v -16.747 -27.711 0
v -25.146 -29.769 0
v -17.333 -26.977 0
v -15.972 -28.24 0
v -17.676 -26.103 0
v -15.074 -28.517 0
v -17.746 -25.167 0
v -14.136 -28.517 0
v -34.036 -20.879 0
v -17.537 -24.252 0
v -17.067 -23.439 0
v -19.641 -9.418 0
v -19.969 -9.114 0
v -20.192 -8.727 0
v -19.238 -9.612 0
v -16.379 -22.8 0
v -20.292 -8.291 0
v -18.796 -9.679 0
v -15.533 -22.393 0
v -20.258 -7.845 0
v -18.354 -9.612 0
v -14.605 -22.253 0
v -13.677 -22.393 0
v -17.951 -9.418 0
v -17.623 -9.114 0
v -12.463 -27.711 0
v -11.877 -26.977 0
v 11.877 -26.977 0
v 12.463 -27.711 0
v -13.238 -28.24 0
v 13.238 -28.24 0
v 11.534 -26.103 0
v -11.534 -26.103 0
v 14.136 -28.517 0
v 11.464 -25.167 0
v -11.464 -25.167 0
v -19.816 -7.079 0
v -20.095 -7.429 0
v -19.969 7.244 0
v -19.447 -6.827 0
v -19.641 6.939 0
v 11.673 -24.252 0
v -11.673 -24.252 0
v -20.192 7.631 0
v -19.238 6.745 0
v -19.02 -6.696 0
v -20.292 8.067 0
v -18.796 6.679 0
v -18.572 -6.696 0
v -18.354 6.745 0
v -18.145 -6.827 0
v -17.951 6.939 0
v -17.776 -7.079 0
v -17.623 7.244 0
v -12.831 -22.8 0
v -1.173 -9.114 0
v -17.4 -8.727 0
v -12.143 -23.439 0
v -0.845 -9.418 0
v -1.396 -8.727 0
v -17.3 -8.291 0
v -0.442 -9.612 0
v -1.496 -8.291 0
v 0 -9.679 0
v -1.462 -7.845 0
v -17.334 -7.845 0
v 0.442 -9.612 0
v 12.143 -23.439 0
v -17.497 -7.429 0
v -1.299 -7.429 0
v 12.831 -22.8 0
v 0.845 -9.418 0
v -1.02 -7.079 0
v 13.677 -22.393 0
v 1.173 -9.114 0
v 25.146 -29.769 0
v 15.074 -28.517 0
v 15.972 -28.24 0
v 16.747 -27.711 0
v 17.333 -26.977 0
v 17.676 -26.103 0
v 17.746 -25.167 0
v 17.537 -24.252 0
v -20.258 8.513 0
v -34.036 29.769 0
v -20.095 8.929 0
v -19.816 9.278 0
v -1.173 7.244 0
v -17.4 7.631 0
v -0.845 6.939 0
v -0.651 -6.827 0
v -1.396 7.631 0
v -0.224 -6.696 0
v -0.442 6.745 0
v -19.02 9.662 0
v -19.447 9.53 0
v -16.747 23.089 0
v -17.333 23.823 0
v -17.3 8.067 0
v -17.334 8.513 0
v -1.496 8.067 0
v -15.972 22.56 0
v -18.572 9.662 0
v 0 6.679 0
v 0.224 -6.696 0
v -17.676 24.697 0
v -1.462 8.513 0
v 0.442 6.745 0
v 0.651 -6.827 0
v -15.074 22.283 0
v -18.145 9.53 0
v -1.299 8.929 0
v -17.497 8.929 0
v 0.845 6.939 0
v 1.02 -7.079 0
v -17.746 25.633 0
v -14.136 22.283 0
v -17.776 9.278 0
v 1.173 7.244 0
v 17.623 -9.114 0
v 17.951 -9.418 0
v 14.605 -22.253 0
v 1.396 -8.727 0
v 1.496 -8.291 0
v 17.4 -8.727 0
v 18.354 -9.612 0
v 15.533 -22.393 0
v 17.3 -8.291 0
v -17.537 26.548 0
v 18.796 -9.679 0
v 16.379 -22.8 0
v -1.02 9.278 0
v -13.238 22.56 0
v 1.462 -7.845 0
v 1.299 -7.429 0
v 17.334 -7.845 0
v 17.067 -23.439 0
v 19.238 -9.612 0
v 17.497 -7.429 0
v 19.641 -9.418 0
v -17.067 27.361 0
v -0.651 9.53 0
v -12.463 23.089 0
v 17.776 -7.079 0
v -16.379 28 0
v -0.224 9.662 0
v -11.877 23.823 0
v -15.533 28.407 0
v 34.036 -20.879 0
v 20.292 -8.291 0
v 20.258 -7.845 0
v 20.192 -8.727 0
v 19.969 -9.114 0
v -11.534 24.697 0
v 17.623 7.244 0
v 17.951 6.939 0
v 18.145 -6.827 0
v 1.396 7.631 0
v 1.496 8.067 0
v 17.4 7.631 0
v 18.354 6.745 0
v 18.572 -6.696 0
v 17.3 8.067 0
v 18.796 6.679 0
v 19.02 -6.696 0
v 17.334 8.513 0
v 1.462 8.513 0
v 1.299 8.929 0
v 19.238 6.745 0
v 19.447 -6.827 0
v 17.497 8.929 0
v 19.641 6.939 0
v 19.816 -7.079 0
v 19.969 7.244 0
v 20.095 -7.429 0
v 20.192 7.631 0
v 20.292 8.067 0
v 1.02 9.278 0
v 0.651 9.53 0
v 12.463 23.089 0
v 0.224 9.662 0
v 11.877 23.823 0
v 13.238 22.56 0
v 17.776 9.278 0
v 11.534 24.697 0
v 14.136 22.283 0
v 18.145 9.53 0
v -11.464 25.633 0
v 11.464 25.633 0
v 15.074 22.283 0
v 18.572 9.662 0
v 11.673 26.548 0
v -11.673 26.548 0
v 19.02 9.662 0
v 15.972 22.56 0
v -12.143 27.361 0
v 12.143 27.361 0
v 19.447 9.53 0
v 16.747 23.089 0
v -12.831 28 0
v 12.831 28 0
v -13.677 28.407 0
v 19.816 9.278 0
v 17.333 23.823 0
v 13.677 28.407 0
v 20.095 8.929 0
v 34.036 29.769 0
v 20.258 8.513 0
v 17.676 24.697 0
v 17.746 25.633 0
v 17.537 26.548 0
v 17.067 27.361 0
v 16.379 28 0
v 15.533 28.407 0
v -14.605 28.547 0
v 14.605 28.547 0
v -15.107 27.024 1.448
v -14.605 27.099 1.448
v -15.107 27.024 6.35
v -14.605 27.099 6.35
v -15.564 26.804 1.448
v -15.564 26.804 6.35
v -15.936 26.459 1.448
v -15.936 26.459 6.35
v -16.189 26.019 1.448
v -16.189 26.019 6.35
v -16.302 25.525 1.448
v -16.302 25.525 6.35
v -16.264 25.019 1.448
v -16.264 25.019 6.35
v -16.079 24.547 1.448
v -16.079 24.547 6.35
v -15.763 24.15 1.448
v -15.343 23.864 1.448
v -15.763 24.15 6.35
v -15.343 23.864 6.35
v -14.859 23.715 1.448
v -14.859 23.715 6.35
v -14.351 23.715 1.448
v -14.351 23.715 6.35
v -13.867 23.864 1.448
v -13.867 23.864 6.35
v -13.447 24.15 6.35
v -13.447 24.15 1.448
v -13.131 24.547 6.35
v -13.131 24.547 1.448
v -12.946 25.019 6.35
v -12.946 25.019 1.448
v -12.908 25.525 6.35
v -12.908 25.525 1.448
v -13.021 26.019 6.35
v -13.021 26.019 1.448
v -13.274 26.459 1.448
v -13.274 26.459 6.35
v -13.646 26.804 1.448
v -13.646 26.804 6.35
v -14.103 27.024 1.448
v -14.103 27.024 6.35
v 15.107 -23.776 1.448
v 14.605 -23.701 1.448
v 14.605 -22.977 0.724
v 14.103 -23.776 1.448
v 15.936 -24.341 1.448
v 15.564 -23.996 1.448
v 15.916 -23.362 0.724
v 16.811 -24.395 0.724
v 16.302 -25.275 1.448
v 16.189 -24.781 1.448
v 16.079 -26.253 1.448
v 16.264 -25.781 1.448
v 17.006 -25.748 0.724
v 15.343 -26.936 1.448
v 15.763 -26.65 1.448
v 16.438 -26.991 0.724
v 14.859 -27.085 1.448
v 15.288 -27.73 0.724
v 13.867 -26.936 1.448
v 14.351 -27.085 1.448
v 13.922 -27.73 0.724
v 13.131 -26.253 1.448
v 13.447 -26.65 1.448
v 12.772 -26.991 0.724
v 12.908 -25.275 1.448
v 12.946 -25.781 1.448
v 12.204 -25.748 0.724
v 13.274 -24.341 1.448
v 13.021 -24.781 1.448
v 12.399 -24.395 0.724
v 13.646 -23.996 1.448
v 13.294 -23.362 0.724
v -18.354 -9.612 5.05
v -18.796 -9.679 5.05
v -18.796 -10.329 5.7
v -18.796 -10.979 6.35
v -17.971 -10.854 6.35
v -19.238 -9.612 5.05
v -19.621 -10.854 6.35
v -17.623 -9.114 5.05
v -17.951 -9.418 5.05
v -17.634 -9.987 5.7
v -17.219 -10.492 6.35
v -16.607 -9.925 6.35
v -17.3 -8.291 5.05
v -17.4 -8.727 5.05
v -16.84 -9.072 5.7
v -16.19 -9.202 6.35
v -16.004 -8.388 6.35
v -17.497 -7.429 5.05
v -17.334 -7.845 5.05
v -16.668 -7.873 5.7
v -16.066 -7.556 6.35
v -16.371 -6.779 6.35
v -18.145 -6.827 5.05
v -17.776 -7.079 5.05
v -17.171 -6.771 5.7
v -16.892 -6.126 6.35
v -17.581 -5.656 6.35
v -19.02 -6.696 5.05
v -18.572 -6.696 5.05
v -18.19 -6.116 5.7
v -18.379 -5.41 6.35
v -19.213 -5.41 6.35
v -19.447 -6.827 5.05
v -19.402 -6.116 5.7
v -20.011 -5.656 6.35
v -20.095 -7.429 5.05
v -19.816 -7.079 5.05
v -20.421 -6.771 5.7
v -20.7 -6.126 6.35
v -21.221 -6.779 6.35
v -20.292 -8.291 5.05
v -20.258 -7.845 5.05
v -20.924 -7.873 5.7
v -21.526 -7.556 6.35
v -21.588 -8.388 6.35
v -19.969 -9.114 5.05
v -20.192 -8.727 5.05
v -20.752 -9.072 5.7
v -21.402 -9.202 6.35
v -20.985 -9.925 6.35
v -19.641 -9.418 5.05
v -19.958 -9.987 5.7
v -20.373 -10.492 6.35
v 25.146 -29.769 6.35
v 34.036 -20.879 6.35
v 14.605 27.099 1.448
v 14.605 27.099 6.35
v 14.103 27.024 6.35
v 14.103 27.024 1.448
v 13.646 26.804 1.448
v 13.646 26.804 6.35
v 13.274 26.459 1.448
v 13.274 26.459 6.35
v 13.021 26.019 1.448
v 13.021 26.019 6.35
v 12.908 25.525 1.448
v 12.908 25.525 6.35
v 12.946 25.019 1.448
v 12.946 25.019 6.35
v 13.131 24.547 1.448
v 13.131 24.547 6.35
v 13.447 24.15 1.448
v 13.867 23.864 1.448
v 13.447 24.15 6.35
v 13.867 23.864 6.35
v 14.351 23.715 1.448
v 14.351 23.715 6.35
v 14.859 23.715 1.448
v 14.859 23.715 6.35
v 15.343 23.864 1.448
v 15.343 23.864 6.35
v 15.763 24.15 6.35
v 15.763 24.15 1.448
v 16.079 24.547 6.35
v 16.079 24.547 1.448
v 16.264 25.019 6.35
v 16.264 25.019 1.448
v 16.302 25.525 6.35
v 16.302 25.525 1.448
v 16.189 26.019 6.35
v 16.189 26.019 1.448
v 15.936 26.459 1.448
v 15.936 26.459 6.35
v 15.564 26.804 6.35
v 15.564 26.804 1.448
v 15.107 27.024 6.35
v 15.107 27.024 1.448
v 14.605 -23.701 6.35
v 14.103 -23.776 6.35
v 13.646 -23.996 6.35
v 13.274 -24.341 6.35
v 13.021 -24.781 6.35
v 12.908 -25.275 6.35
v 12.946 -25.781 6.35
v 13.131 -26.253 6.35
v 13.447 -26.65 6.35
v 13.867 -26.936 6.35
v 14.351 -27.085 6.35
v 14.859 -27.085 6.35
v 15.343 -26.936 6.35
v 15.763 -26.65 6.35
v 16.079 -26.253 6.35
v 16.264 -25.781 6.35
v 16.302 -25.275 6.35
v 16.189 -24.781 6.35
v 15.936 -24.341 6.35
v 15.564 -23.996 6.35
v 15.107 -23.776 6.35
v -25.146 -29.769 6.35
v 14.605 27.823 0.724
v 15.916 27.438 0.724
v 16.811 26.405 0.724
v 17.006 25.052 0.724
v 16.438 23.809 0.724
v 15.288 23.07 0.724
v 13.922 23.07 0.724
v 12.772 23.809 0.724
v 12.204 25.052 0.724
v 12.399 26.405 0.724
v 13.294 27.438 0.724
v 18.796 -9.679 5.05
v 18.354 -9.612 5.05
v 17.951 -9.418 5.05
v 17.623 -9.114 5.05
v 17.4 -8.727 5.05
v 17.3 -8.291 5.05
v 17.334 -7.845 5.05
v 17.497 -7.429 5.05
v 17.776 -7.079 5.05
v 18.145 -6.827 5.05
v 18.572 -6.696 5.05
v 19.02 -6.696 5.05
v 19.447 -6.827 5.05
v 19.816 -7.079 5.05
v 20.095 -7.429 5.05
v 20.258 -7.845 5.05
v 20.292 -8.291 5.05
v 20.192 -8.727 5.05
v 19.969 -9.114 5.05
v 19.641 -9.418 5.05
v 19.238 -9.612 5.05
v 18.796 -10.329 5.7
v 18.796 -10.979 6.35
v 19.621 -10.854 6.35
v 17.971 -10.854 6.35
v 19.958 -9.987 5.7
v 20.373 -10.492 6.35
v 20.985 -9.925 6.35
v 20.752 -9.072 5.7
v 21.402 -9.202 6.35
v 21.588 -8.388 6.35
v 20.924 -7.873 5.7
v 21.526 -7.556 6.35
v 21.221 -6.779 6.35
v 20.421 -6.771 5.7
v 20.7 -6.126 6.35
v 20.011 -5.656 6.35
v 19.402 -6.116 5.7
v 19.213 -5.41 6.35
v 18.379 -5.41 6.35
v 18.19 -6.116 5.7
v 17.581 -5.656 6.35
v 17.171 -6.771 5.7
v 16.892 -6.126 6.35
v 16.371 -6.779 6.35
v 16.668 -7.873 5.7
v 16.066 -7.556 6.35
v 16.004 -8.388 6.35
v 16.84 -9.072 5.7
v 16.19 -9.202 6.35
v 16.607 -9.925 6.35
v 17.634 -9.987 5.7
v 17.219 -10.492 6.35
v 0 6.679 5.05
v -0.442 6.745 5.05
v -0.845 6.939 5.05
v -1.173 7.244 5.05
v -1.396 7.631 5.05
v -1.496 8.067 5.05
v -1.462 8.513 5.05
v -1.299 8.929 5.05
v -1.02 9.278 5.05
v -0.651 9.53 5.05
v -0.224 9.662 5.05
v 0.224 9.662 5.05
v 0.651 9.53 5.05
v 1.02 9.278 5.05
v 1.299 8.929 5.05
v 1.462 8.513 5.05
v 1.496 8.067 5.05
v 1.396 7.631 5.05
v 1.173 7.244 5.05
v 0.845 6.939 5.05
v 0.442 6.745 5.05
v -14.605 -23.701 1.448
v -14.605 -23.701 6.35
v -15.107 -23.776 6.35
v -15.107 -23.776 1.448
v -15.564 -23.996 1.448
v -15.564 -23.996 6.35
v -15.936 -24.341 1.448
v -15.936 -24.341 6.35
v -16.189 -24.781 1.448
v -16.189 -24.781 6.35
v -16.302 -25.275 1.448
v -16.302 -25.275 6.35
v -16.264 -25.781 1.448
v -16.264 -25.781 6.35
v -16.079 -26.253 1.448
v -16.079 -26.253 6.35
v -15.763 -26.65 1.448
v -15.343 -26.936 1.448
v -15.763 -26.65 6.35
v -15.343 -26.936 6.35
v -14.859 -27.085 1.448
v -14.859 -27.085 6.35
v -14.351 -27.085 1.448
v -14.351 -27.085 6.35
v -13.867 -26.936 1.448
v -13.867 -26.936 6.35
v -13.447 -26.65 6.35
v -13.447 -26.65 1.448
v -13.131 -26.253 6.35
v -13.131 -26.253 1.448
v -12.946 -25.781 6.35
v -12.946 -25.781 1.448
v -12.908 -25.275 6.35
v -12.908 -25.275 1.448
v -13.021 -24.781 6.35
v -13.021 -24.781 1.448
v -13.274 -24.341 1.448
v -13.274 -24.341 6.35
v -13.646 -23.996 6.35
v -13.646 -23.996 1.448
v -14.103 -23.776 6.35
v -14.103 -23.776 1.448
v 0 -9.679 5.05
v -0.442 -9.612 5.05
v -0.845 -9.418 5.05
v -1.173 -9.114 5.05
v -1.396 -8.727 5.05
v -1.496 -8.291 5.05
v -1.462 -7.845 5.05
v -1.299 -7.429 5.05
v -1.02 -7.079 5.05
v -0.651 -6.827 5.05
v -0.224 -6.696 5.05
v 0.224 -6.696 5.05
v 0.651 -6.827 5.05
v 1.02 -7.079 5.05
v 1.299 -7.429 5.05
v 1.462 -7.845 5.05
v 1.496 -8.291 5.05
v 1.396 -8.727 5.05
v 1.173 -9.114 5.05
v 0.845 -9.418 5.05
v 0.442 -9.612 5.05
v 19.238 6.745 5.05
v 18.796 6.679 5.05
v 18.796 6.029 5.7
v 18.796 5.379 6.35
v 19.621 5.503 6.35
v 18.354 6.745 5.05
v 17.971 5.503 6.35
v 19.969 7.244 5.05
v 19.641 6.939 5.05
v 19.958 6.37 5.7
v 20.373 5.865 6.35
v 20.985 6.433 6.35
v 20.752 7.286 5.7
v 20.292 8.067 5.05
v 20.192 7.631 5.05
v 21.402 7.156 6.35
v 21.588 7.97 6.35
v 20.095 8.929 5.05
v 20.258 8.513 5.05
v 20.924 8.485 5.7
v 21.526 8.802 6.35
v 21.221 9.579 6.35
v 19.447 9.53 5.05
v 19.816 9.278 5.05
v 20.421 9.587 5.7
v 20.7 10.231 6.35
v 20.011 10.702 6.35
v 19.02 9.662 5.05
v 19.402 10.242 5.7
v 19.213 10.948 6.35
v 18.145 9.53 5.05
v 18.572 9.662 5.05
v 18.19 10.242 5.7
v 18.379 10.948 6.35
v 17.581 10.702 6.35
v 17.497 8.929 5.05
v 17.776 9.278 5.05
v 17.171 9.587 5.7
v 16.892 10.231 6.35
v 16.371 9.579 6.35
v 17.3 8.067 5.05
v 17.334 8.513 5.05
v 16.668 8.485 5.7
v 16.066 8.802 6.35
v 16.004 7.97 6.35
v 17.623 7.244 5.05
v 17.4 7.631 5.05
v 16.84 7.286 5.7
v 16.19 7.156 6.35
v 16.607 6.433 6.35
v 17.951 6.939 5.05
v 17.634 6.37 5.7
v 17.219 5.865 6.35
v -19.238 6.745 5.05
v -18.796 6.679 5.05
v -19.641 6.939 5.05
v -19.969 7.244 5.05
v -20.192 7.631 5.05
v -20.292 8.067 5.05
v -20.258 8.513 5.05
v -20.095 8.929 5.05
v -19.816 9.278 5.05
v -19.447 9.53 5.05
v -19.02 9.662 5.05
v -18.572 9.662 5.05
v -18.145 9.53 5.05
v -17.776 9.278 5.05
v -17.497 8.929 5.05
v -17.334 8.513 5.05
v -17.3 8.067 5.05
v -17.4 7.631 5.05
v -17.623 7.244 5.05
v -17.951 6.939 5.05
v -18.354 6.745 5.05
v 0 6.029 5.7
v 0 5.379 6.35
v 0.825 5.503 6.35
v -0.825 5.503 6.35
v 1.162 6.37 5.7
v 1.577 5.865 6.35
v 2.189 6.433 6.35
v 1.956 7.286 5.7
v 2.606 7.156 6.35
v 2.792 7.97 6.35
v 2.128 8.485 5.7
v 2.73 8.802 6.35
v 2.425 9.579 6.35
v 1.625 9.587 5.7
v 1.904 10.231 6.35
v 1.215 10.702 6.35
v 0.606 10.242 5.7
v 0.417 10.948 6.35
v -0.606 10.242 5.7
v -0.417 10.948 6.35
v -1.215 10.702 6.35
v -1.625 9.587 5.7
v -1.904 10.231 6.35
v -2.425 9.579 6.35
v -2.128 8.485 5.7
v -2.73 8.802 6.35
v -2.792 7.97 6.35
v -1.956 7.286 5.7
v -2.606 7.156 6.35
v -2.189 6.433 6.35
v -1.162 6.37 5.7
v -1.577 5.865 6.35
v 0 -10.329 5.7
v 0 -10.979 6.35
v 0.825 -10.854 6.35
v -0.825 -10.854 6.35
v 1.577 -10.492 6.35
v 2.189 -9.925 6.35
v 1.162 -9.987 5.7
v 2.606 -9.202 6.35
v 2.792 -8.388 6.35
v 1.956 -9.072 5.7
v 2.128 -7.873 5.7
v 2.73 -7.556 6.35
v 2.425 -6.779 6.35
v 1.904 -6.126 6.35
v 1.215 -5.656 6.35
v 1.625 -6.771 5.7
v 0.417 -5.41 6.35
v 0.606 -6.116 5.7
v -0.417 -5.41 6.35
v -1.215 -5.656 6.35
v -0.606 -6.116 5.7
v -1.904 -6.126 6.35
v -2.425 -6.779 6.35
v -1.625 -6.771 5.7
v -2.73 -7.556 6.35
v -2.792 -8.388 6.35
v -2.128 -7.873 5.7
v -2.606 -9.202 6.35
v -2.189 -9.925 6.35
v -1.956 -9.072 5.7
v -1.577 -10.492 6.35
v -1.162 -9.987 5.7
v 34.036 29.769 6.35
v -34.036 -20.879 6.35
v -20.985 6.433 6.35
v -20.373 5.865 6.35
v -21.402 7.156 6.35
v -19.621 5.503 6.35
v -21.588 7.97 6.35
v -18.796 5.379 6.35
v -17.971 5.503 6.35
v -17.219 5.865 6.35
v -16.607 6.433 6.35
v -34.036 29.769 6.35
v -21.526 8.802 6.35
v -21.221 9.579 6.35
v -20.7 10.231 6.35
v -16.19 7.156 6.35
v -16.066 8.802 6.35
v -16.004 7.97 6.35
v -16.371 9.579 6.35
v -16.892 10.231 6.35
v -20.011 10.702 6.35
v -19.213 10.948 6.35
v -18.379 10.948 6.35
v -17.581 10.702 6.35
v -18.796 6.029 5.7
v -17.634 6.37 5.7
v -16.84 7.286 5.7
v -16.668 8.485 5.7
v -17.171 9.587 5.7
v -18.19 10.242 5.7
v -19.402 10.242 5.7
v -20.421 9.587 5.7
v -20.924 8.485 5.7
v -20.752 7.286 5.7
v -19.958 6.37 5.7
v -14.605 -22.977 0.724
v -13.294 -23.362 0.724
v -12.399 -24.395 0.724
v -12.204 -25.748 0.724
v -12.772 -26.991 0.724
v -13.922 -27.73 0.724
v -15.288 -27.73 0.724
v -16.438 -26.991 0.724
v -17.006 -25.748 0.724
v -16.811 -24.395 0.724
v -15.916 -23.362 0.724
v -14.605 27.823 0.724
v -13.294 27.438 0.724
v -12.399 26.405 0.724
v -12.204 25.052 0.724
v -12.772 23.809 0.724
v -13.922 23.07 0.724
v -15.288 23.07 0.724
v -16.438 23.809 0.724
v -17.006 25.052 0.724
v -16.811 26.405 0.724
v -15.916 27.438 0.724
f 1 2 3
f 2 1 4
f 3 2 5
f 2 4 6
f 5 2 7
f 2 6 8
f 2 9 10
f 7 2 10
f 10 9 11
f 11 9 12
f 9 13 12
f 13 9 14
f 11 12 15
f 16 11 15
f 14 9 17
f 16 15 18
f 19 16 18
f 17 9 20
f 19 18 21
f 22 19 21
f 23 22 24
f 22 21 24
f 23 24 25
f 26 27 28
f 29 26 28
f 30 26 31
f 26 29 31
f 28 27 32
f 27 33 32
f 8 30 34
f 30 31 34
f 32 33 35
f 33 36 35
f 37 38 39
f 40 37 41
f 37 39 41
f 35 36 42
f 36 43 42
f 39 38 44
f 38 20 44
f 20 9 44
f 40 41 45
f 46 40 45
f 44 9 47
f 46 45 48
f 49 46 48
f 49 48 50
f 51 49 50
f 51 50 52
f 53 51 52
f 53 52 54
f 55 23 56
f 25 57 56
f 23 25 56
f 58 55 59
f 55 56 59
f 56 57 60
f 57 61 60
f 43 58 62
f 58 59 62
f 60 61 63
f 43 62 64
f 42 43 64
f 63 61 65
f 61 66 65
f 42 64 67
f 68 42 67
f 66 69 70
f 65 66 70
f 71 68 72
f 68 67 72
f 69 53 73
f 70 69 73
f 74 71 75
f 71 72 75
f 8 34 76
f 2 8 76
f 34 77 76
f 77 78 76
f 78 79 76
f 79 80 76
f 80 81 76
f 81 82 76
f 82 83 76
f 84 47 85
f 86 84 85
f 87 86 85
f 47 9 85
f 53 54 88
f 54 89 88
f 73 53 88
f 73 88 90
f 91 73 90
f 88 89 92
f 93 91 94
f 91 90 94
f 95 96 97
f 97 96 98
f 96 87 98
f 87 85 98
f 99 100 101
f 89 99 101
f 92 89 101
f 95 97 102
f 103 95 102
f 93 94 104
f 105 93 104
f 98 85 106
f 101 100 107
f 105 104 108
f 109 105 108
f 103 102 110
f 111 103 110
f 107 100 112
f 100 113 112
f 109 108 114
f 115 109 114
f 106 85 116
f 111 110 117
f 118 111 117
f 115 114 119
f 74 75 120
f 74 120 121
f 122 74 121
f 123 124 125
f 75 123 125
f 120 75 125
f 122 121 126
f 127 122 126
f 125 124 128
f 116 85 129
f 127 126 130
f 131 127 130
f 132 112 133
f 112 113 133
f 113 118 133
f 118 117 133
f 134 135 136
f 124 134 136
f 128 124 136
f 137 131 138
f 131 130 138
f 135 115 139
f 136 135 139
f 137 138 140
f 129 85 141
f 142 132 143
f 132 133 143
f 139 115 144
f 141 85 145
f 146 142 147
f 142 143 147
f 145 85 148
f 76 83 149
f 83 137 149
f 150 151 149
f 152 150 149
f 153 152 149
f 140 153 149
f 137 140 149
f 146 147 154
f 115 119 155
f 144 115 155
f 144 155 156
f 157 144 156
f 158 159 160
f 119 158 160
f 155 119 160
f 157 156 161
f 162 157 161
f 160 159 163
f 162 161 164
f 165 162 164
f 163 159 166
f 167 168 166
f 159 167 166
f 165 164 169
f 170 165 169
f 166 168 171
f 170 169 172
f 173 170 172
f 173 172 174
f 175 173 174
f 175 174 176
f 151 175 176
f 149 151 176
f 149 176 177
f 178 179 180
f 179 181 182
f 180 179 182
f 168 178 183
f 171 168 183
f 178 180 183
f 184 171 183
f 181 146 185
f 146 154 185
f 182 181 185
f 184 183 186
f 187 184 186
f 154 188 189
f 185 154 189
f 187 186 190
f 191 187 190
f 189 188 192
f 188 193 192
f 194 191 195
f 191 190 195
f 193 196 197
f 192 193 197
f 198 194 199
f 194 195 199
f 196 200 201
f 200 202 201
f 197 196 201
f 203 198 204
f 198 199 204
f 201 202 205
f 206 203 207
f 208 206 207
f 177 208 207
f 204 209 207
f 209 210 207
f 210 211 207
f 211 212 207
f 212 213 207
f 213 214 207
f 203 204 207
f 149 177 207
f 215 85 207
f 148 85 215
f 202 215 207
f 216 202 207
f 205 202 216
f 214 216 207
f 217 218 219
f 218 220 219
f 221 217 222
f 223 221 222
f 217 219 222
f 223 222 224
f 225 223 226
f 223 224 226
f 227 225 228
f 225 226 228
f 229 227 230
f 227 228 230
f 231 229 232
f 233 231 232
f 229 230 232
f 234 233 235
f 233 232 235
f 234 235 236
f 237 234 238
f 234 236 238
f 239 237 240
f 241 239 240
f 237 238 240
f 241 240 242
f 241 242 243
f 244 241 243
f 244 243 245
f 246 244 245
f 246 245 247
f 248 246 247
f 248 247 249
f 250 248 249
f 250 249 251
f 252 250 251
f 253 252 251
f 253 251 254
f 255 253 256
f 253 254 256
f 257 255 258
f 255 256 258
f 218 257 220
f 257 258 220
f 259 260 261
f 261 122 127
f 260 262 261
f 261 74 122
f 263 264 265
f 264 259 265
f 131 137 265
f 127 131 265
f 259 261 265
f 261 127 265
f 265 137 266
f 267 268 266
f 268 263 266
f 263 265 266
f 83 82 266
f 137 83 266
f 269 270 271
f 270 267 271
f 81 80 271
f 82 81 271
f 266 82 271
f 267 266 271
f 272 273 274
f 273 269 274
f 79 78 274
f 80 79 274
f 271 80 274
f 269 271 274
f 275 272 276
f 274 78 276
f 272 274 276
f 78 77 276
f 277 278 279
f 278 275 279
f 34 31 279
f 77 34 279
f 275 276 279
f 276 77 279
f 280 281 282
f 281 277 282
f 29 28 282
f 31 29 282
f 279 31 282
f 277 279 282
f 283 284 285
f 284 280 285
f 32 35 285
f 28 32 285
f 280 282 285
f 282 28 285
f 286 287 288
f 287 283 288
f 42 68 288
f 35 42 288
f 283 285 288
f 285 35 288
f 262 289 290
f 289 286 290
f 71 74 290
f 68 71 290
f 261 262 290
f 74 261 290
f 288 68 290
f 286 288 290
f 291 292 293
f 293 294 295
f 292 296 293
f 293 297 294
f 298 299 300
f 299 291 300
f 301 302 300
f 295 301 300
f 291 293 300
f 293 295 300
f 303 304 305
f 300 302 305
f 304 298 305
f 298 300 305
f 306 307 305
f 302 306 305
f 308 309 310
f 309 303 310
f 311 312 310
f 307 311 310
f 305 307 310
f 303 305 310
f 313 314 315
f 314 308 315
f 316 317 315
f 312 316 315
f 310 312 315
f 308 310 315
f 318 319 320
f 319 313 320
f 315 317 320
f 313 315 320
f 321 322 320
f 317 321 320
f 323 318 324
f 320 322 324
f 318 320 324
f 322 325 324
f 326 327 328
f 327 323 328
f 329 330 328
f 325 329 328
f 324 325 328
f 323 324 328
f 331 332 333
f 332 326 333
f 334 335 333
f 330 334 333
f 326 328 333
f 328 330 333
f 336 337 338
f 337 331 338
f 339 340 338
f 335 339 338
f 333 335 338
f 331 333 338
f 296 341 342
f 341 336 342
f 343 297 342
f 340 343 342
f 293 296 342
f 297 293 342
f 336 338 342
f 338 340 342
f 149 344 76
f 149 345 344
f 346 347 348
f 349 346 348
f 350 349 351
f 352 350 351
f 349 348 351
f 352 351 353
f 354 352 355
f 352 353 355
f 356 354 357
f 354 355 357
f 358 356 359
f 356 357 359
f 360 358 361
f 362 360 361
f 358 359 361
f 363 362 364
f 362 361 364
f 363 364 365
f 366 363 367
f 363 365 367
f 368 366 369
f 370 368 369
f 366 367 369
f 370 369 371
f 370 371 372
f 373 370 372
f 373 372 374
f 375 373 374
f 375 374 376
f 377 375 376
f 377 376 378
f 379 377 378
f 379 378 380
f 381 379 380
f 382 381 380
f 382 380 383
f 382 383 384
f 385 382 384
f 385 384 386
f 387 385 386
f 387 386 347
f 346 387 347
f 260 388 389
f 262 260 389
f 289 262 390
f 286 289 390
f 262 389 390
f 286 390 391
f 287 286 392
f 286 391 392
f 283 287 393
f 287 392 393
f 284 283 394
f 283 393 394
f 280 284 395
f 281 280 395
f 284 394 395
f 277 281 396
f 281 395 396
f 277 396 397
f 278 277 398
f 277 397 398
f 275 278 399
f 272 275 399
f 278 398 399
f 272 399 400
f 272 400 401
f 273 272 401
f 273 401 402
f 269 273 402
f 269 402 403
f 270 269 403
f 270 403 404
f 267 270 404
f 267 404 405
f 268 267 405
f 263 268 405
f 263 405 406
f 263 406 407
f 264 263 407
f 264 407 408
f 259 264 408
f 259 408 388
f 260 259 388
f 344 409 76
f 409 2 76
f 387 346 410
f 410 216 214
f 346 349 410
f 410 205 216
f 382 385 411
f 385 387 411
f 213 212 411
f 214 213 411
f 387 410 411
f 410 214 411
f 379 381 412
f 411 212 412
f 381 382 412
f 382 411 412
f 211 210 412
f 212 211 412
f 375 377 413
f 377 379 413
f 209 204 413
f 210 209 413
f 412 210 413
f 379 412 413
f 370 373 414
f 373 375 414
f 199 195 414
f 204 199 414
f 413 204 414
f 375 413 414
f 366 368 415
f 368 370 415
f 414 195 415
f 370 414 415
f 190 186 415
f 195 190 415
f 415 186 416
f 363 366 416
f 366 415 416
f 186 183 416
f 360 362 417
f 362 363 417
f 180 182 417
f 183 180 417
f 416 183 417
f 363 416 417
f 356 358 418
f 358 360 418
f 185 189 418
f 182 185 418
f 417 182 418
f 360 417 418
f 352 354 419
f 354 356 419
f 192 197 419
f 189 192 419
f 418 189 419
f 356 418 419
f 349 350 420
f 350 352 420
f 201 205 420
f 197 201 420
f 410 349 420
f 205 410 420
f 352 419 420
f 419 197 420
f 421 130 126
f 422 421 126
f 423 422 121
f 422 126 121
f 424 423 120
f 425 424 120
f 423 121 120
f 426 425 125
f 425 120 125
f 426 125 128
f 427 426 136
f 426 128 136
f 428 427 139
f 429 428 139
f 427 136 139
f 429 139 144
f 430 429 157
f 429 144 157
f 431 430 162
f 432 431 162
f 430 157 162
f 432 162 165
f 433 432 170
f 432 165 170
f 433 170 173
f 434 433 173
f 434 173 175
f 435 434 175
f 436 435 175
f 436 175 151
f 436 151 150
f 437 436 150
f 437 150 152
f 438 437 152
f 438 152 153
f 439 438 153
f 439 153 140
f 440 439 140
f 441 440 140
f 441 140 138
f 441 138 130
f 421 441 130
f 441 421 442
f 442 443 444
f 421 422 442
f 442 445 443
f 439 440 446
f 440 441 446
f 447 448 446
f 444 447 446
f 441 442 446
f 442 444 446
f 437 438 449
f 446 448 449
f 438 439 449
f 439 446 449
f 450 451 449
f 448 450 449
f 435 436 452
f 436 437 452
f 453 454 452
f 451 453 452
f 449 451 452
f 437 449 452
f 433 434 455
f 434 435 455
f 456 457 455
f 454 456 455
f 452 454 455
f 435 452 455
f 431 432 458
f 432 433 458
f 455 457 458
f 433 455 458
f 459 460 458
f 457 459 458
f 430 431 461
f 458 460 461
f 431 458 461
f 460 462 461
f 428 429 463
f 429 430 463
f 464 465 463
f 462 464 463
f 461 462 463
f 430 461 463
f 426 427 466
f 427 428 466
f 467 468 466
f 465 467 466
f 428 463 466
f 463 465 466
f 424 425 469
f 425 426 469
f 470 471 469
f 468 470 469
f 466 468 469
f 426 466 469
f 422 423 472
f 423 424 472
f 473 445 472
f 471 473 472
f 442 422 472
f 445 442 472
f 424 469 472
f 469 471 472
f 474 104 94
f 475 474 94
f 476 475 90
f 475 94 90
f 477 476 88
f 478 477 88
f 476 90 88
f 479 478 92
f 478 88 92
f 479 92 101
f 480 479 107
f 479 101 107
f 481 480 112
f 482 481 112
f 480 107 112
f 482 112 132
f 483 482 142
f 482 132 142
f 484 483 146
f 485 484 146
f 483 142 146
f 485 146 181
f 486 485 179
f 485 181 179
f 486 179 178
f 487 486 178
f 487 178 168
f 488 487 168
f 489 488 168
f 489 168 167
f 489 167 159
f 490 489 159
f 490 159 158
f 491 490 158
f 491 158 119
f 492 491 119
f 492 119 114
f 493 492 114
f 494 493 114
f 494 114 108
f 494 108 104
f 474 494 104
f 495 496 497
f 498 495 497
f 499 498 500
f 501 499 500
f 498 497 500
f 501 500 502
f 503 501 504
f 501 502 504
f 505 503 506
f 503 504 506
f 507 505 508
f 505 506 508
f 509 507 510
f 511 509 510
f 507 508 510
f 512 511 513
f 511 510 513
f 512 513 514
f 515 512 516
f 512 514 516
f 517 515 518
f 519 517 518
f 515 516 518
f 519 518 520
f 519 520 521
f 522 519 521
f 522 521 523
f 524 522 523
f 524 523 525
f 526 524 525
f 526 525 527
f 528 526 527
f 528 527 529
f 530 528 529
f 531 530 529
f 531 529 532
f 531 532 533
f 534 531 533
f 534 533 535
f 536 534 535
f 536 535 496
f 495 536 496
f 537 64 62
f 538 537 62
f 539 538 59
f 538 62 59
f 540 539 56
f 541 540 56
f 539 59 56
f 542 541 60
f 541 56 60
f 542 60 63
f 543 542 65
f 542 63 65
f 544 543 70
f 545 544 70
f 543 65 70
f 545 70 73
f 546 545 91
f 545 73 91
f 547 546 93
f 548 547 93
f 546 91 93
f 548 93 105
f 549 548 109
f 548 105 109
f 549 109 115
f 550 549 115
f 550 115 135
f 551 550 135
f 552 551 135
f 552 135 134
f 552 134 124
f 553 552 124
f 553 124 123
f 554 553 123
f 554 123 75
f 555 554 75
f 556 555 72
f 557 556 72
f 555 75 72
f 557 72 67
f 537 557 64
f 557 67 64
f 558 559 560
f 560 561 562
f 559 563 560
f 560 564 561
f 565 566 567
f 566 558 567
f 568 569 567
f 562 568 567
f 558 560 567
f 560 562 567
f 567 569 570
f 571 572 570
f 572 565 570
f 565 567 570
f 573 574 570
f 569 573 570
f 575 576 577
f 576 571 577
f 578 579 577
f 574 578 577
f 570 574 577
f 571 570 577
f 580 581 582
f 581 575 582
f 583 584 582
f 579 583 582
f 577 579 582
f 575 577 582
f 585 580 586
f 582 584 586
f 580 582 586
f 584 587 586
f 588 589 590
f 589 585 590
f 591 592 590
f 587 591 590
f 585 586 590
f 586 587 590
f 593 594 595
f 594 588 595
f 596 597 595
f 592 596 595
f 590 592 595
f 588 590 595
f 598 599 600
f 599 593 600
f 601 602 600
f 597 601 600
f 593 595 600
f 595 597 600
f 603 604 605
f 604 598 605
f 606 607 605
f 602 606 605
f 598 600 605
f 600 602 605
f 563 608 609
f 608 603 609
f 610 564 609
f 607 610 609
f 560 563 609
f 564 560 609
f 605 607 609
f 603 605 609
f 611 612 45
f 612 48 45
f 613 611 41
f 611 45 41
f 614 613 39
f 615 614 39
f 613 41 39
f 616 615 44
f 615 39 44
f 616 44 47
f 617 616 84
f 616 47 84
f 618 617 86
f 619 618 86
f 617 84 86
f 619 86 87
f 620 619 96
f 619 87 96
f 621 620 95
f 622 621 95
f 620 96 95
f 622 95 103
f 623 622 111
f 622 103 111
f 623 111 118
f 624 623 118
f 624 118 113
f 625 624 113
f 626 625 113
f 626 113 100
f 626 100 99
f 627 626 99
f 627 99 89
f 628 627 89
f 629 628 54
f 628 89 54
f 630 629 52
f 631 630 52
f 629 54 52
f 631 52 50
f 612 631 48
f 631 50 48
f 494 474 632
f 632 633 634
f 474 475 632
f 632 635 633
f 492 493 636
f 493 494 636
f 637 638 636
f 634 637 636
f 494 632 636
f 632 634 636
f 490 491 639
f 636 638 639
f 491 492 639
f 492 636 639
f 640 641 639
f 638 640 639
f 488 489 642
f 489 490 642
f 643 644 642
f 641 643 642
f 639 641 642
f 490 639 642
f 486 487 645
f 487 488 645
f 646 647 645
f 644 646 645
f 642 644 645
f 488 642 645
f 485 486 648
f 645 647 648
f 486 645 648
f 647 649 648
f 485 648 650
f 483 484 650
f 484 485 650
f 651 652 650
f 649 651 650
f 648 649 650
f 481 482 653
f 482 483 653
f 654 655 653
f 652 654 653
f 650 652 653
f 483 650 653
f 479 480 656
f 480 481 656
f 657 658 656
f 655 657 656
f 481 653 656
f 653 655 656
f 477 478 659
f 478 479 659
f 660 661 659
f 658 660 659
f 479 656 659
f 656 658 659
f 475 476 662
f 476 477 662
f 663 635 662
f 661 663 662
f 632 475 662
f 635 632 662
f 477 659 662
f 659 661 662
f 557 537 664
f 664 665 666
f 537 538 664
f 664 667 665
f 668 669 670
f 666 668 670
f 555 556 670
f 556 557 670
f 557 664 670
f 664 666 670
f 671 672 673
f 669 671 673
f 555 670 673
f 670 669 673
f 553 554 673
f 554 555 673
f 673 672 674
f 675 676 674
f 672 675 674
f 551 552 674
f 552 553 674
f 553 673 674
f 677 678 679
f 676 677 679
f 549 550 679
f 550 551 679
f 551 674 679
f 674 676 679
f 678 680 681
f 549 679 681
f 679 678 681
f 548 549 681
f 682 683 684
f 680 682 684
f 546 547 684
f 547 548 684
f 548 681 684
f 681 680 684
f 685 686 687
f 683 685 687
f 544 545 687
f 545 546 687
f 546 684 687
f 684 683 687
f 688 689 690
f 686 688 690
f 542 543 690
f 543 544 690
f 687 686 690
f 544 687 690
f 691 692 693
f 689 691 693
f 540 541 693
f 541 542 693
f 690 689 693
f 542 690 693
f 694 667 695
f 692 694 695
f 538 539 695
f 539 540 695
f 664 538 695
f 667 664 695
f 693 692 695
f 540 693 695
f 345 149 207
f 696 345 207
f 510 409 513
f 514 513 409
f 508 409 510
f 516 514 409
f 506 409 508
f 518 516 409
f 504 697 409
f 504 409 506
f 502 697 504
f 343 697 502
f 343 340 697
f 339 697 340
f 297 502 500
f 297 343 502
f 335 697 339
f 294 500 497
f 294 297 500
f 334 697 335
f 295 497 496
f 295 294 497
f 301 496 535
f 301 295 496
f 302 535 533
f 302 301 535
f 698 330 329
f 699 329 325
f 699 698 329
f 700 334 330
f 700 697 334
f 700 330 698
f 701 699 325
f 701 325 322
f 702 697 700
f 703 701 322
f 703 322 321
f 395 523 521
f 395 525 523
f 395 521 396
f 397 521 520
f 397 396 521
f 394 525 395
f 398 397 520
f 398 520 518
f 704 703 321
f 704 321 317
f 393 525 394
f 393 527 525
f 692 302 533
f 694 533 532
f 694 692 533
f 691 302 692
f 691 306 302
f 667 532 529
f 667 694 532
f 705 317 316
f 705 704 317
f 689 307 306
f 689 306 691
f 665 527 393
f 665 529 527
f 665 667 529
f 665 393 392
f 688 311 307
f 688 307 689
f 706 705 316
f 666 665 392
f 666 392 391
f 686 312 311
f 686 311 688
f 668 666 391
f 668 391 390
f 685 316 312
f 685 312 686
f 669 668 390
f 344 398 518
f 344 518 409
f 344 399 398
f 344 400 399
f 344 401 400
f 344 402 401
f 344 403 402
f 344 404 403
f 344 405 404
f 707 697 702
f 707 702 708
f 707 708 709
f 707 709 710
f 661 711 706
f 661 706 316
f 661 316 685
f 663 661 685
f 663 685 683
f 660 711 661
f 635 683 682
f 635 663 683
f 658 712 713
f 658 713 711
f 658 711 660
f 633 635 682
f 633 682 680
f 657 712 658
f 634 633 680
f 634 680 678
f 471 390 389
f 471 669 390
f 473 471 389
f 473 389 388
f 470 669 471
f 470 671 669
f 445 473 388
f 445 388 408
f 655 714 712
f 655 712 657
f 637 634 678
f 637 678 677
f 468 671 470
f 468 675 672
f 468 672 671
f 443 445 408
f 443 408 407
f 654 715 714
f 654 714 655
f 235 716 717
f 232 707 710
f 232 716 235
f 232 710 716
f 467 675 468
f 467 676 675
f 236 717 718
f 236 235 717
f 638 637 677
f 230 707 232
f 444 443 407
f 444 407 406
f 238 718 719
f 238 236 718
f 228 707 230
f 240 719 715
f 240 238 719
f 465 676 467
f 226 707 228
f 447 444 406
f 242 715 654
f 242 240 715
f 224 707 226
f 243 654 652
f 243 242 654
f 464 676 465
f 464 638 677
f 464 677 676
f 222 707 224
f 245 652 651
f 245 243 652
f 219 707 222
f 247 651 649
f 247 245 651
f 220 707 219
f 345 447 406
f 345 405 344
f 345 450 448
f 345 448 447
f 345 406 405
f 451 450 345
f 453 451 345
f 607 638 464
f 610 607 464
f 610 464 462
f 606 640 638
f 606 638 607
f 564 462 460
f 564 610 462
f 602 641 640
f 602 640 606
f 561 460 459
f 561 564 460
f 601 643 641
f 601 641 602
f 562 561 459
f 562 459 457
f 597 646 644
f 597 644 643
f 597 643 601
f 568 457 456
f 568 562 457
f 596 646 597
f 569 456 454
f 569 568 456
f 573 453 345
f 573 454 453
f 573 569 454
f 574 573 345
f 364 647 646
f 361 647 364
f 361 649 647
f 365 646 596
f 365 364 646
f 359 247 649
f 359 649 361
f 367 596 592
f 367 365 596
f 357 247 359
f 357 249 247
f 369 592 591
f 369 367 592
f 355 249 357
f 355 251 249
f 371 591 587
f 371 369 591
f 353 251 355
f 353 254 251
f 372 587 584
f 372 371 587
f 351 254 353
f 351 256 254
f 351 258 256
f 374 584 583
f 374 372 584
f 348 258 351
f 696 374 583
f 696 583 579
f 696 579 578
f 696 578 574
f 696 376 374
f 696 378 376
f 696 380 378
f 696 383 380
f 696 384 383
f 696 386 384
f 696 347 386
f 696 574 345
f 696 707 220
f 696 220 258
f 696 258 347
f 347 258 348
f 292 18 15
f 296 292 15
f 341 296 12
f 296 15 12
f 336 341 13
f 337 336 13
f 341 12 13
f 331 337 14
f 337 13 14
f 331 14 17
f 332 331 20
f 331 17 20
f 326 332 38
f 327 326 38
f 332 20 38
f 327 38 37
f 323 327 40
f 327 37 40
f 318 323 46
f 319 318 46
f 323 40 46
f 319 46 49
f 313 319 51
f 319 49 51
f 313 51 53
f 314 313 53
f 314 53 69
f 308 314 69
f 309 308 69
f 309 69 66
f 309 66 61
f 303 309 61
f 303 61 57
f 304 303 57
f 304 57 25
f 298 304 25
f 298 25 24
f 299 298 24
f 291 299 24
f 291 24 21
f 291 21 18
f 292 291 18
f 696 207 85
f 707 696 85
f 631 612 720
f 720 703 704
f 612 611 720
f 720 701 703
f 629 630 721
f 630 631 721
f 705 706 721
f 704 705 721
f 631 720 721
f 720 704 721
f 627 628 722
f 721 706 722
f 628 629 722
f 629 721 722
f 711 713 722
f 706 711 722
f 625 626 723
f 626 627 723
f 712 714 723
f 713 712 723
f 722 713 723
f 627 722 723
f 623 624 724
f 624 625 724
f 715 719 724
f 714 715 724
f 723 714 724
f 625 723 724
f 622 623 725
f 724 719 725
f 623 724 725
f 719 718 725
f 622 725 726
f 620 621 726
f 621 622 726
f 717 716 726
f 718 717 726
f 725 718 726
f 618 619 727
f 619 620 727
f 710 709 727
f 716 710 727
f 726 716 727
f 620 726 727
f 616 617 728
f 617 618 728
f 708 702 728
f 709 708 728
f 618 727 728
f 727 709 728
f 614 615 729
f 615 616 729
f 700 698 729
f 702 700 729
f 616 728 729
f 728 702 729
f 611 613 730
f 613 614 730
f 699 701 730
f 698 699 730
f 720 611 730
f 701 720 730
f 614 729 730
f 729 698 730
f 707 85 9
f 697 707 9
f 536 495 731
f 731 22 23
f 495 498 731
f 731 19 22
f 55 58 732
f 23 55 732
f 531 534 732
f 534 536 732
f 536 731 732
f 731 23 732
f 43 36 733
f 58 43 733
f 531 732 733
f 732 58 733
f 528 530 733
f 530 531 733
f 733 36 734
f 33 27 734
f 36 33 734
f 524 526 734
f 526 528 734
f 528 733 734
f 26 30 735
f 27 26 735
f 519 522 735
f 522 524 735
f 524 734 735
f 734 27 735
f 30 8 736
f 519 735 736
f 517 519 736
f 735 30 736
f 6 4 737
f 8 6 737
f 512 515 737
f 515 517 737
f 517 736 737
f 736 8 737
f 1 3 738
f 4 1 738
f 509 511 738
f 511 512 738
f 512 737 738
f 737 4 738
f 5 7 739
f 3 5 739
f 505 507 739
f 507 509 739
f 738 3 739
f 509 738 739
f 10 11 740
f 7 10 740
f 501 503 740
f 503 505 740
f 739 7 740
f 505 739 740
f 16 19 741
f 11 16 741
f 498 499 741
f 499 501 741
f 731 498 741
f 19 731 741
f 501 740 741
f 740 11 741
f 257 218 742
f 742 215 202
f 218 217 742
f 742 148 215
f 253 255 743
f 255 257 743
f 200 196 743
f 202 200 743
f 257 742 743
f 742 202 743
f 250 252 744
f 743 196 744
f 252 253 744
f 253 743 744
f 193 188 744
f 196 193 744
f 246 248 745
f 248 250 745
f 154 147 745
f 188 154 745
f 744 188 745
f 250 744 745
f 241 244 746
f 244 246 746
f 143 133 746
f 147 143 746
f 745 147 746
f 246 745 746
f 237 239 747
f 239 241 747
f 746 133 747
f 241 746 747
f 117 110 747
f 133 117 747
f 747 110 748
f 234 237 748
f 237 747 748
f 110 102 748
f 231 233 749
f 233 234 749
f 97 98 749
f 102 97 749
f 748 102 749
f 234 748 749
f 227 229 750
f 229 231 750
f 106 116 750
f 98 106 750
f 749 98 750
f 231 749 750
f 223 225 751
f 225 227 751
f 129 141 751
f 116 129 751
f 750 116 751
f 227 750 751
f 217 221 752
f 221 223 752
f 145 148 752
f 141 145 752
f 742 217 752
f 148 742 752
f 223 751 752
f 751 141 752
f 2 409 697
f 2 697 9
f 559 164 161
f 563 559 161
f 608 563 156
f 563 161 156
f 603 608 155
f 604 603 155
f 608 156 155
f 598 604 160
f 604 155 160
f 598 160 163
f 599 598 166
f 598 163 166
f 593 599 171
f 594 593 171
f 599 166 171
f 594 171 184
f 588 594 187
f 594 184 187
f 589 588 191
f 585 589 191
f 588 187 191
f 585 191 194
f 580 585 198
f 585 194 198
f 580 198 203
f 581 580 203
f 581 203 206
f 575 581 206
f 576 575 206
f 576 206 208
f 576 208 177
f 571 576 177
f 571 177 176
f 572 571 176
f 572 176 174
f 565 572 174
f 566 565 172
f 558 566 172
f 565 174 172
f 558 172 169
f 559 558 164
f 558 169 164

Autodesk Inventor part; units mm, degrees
ref_plane "YZ Plane" through (0, 0, 0) normal (1, 0, 0) x (0, 1, 0)
ref_plane "XZ Plane" through (0, 0, 0) normal (0, 1, 0) x (-1, 0, 0)
ref_plane "XY Plane" through (0, 0, 0) normal (0, 0, 1) x (1, 0, 0)
sketch "Sketch1" plane through (0, 0, 0) normal (0, 0, 1) x (1, 0, 0)
  line L0 (-34.036, -29.7688) -> (34.036, -29.7688)
  line L1 (34.036, -29.7688) -> (34.036, 29.7688)
  line L2 (34.036, 29.7688) -> (-34.036, 29.7688)
  line L3 (-34.036, 29.7688) -> (-34.036, -29.7688)
  line L4 (-34.036, -29.7688) -> (34.036, 29.7688) construction
  line L5 (34.036, -29.7688) -> (-34.036, 29.7688) construction
  point P0 (0, 0)
  dimension "d0" = 68.072
  dimension "d1" = 59.5376
extrude "Extrusion1" add sketch "Sketch1" along normal blind 6.35
sketch "Sketch3" plane through (0, 0, 6.35) normal (0, 0, 1) x (1, 0, 0)
  line L0 (34.036, 29.7688) -> (-34.036, 29.7688) projected
  line L1 (-34.036, -29.7688) -> (34.036, -29.7688) projected
  line L2 (-34.036, 29.7688) -> (-34.036, -29.7688) projected
  line L3 (34.036, -29.7688) -> (34.036, 29.7688) projected
  point P0 (0, 0)
  point P1 (-18.796, 8.1788)
  point P2 (-18.796, -8.1788)
  point P3 (18.796, -8.1788)
  point P4 (18.796, 8.1788)
  point P5 (0, 8.1788)
  point P6 (0, -8.1788)
  dimension "d17" = 21.59
  dimension "d18" = 21.59
  dimension "d19" = 15.24
  dimension "d20" = 15.24
  dimension "d21" = 18.796
  dimension "d23" = 37.592
hole "Hole2" at (-18.796, 8.1788, 6.35) at (-18.796, -8.1788, 6.35) at (18.796, -8.1788, 6.35) at (18.796, 8.1788, 6.35) at (0, 8.1788, 6.35) at (0, -8.1788, 6.35) direction (0, 0, -1) diameter 3 depth 25.4 tip angle 118 countersink diameter 5.6 countersink angle 90
chamfer "Chamfer1" distance 8.89 angle 45 2 edges at (-34.036, -29.7688, 3.175) (34.036, -29.7688, 3.175)
sketch "Sketch4" plane through (0, 0, 0) normal (0, 0, -1) x (-1, 0, 0)
  circle A0 centre (-14.605, -25.4024) radius 1.7018 projected
  circle A1 centre (14.605, -25.4024) radius 1.7018 projected
  circle A2 centre (14.605, 25.3976) radius 1.7018 projected
  circle A3 centre (-14.605, 25.3976) radius 1.7018 projected
  point P0 (0, 0)
hole "Hole3" at (14.605, -25.4024, 0) at (-14.605, -25.4024, 0) at (-14.605, 25.3976, 0) at (14.605, 25.3976, 0) direction (0, 0, 1) diameter 3.4036 end through all countersink diameter 6.2992 countersink angle 90 clearance for "Flat Head Machine Screw" size "M3" standard "Ansi Metric M Profile"
equation "\"d18\" = d17"
equation "\"d20\" = d19"
equation "\"d21\" = 0.5 * d23"
properties part number "DPLX_P032_VIPE Insulation Middle" material "Polyethylene, High Density"
